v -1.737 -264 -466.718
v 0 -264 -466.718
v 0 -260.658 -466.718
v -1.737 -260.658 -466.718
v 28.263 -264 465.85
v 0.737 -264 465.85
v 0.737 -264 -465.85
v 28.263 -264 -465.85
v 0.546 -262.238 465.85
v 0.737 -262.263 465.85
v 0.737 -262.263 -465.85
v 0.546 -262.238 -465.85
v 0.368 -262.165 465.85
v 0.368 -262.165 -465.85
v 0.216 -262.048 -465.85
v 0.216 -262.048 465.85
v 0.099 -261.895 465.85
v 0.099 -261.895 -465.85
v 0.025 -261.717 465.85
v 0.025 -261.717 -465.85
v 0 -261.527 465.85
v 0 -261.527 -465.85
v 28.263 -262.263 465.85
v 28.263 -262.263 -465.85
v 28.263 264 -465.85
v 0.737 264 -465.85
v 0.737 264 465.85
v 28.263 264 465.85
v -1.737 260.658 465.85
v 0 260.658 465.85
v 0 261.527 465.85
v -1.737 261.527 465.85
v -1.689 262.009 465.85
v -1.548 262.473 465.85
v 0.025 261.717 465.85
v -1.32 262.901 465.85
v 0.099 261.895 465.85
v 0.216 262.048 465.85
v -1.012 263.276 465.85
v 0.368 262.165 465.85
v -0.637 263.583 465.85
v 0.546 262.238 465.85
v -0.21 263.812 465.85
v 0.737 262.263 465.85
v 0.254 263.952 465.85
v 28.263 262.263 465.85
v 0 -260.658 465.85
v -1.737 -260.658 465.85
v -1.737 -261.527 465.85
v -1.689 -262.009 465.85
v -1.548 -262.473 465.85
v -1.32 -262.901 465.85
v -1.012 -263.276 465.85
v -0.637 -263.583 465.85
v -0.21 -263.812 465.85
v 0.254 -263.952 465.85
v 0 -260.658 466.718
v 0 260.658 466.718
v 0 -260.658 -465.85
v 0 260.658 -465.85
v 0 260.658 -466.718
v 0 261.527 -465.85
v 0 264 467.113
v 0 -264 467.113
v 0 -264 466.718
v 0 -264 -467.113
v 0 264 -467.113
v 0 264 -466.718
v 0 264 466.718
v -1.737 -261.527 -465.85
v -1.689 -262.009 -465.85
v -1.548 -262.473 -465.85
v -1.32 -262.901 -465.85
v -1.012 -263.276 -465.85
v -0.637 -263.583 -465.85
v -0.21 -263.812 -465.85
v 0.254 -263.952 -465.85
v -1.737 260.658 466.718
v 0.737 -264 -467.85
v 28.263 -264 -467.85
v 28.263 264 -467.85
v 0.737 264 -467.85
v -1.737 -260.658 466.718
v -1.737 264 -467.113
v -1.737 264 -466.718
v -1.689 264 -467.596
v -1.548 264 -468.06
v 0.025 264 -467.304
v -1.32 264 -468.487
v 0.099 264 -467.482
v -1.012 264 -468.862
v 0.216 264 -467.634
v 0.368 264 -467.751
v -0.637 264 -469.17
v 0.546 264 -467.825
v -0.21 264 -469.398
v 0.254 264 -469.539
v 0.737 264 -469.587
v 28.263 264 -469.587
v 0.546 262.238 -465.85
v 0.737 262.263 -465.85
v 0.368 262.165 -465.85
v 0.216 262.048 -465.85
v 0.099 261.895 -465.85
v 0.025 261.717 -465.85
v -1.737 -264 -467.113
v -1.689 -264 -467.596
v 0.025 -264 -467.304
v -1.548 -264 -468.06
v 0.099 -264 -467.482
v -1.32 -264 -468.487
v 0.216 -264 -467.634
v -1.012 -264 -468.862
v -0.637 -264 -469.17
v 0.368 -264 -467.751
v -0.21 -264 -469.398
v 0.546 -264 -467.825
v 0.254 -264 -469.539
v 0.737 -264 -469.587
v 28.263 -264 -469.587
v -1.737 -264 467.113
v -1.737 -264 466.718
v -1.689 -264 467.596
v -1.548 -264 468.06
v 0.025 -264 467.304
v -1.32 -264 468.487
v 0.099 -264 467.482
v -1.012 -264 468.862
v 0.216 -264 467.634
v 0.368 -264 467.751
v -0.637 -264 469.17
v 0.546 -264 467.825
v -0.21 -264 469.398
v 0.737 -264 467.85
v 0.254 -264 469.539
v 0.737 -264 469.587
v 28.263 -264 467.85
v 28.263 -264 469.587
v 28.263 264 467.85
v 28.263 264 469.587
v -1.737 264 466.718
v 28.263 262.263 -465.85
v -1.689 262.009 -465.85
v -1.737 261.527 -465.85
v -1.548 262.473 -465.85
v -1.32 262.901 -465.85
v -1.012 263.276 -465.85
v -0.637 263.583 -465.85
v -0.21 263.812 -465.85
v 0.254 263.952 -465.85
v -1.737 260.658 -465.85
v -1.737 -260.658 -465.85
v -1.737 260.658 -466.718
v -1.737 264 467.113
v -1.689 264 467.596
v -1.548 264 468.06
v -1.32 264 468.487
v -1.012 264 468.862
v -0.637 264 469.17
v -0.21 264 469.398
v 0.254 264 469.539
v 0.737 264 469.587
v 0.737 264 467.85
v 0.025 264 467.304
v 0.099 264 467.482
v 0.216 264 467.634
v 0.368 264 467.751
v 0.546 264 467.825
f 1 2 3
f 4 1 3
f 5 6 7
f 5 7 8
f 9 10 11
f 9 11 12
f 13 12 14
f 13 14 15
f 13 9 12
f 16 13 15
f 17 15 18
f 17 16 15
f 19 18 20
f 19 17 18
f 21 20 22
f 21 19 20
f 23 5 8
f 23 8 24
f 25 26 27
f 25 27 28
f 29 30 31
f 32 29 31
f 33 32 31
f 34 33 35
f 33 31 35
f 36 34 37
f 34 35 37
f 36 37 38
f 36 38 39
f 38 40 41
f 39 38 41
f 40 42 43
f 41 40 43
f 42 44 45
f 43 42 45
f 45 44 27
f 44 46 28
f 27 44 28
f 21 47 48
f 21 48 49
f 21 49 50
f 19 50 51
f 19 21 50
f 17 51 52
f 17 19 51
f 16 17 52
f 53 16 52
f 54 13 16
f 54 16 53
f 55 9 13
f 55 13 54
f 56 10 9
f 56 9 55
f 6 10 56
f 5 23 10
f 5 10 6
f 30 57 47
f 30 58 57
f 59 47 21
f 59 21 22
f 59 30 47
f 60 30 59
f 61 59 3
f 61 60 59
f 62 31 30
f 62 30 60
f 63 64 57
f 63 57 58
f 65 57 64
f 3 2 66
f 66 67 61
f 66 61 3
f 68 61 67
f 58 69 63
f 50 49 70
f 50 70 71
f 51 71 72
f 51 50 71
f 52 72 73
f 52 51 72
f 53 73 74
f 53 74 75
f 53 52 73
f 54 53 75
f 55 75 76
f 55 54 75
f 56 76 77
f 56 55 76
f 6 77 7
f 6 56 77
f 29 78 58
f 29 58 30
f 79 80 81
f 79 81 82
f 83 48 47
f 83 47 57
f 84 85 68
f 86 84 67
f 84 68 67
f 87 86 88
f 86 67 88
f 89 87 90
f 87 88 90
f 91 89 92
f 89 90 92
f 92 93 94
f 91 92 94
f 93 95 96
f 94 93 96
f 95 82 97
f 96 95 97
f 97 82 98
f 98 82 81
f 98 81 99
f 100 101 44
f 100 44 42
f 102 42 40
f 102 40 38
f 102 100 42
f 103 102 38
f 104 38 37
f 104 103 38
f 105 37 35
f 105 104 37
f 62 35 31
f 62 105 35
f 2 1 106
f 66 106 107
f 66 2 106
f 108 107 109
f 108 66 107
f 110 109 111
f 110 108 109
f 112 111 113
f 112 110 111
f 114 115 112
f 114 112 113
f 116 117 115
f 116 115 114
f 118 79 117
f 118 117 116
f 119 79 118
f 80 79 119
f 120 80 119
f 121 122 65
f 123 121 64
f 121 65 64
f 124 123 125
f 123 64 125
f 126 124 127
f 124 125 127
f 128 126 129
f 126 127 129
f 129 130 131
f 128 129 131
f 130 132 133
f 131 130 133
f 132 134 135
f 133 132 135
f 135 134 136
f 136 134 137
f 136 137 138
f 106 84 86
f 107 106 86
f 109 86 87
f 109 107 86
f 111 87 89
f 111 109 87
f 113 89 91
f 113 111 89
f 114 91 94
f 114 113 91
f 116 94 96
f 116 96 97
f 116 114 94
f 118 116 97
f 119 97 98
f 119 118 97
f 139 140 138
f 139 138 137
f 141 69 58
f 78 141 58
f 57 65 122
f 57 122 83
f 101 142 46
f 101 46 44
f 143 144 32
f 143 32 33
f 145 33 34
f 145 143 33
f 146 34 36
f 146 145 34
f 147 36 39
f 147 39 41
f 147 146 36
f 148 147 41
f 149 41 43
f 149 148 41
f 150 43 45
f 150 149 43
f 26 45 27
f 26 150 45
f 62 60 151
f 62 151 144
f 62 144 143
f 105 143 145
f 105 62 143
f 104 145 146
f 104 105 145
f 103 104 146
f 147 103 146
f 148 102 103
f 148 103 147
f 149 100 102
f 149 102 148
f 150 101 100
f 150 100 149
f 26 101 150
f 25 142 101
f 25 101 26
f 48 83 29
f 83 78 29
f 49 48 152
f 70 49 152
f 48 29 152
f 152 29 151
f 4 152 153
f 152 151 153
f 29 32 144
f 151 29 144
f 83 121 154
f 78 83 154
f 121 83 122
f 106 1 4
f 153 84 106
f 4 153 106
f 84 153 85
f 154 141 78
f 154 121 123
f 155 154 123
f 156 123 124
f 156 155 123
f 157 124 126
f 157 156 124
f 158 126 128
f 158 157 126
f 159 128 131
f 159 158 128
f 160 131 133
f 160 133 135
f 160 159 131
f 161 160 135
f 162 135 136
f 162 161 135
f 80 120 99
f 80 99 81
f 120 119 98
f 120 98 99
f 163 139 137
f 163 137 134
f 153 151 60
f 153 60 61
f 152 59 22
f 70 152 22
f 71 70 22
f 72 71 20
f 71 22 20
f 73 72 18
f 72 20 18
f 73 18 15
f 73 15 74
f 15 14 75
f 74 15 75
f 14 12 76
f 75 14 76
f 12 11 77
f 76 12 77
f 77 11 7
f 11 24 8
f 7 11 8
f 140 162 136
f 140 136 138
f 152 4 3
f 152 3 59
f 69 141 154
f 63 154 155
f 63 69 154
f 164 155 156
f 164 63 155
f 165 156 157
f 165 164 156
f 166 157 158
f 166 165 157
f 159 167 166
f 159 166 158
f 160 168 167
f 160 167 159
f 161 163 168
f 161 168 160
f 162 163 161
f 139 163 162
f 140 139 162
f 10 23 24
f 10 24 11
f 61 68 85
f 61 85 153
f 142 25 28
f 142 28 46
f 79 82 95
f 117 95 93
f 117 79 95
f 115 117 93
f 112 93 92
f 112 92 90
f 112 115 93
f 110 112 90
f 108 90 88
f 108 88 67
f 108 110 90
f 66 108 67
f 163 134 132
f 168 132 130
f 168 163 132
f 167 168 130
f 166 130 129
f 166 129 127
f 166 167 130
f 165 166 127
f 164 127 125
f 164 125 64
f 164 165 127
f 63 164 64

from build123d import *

# Parameters (mm, degrees)
SKETCH1_W                     = 935.7
SKETCH1_H                     = 528
BASE_FLANGE1_DEPTH            = 1.7366
EDGE_FLANGE1_STRIP_W          = 8.4196
EDGE_FLANGE1_STRIP_H          = 1.7366
EDGE_FLANGE1_STRIP_CUT_DEPTH  = 931.7
EDGE_FLANGE1_RELIEF_W         = 9.2879
EDGE_FLANGE1_RELIEF_H         = 0.8683
EDGE_FLANGE1_RELIEF_CUT_DEPTH = 1.7366
EDGE_FLANGE1_DEPTH            = 931.7
EDGE_FLANGE2_STRIP_W          = 8.4196
EDGE_FLANGE2_STRIP_H          = 1.7366
EDGE_FLANGE2_STRIP_CUT_DEPTH  = 931.7
EDGE_FLANGE2_RELIEF_W         = 9.2879
EDGE_FLANGE2_RELIEF_H         = 0.8683
EDGE_FLANGE2_RELIEF_CUT_DEPTH = 1.7366
EDGE_FLANGE2_DEPTH            = 931.7
EDGE_FLANGE4_STRIP_W          = 8.4196
EDGE_FLANGE4_STRIP_H          = 1.7366
EDGE_FLANGE4_STRIP_CUT_DEPTH  = 528
EDGE_FLANGE4_DEPTH            = 528
EDGE_FLANGE5_STRIP_W          = 8.4196
EDGE_FLANGE5_STRIP_H          = 1.7366
EDGE_FLANGE5_STRIP_CUT_DEPTH  = 528
EDGE_FLANGE5_DEPTH            = 528


# Sheet-metal steps are written as plain solids
with BuildPart() as part:
    # Sketch1 → Base-Flange1 (new body)
    with BuildSketch(Plane(origin=(0, 0, 0), x_dir=(0, 0, -1), z_dir=(1, 0, 0))):
        Rectangle(SKETCH1_W, SKETCH1_H)
    extrude(amount=-BASE_FLANGE1_DEPTH)

    # Edge-Flange1 strip (across the edge) → Edge-Flange1 strip cut (cut)
    with BuildSketch(Plane(origin=(0, 264, -465.85), x_dir=(0, -1, 0), z_dir=(0, 0, 1))):
        with Locations((-1.7366, -0.8683)):
            Rectangle(EDGE_FLANGE1_STRIP_W, EDGE_FLANGE1_STRIP_H)
    extrude(amount=EDGE_FLANGE1_STRIP_CUT_DEPTH, mode=Mode.SUBTRACT)

    # Edge-Flange1 relief (on the sheet) → Edge-Flange1 relief cut (cut)
    with BuildSketch(Plane(origin=(0, 261.5268, -465.85), x_dir=(0, -1, 0), z_dir=(1, 0, 0))):
        with Locations((-3.77565, 0.43415)):
            Rectangle(EDGE_FLANGE1_RELIEF_W, EDGE_FLANGE1_RELIEF_H)
        with Locations((-3.77565, -932.13415)):
            Rectangle(EDGE_FLANGE1_RELIEF_W, EDGE_FLANGE1_RELIEF_H)
    extrude(amount=-EDGE_FLANGE1_RELIEF_CUT_DEPTH, mode=Mode.SUBTRACT)

    # Edge-Flange1 section (across the edge) → Edge-Flange1 (add)
    with BuildSketch(Plane(origin=(0, 264, -465.85), x_dir=(0, -1, 0), z_dir=(0, 0, 1))):
        with BuildLine():
            Line((0, 0.7366), (0, 28.2634))
            Line((0, 28.2634), (1.7366, 28.2634))
            Line((1.7366, 28.2634), (1.7366, 0.7366))
            ThreePointArc((1.7366, 0.7366), (1.952345145, 0.215745145), (2.4732, 0))
            Line((2.4732, 0), (2.4732, -1.7366))
            ThreePointArc((2.4732, -1.7366), (0.724383509, -1.012216491), (0, 0.7366))
        make_face()
    extrude(amount=EDGE_FLANGE1_DEPTH)

    # Edge-Flange2 strip (across the edge) → Edge-Flange2 strip cut (cut)
    with BuildSketch(Plane(origin=(0, -264, 465.85), x_dir=(0, 1, 0), z_dir=(0, 0, -1))):
        with Locations((-1.7366, -0.8683)):
            Rectangle(EDGE_FLANGE2_STRIP_W, EDGE_FLANGE2_STRIP_H)
    extrude(amount=EDGE_FLANGE2_STRIP_CUT_DEPTH, mode=Mode.SUBTRACT)

    # Edge-Flange2 relief (on the sheet) → Edge-Flange2 relief cut (cut)
    with BuildSketch(Plane(origin=(0, -261.5268, 465.85), x_dir=(0, 1, 0), z_dir=(1, 0, 0))):
        with Locations((-3.77565, 0.43415)):
            Rectangle(EDGE_FLANGE2_RELIEF_W, EDGE_FLANGE2_RELIEF_H)
        with Locations((-3.77565, -932.13415)):
            Rectangle(EDGE_FLANGE2_RELIEF_W, EDGE_FLANGE2_RELIEF_H)
    extrude(amount=-EDGE_FLANGE2_RELIEF_CUT_DEPTH, mode=Mode.SUBTRACT)

    # Edge-Flange2 section (across the edge) → Edge-Flange2 (add)
    with BuildSketch(Plane(origin=(0, -264, 465.85), x_dir=(0, 1, 0), z_dir=(0, 0, -1))):
        with BuildLine():
            Line((0, 0.7366), (0, 28.2634))
            Line((0, 28.2634), (1.7366, 28.2634))
            Line((1.7366, 28.2634), (1.7366, 0.7366))
            ThreePointArc((1.7366, 0.7366), (1.952345145, 0.215745145), (2.4732, 0))
            Line((2.4732, 0), (2.4732, -1.7366))
            ThreePointArc((2.4732, -1.7366), (0.724383509, -1.012216491), (0, 0.7366))
        make_face()
    extrude(amount=EDGE_FLANGE2_DEPTH)

    # Edge-Flange4 strip (across the edge) → Edge-Flange4 strip cut (cut)
    with BuildSketch(Plane(origin=(0, 264, 467.85), x_dir=(0, 0, -1), z_dir=(0, -1, 0))):
        with Locations((-3.4732, -0.8683)):
            Rectangle(EDGE_FLANGE4_STRIP_W, EDGE_FLANGE4_STRIP_H)
    extrude(amount=EDGE_FLANGE4_STRIP_CUT_DEPTH, mode=Mode.SUBTRACT)

    # Edge-Flange4 section (across the edge) → Edge-Flange4 (add)
    with BuildSketch(Plane(origin=(0, 264, 467.85), x_dir=(0, 0, -1), z_dir=(0, -1, 0))):
        with BuildLine():
            Line((-1.7366, 0.7366), (-1.7366, 28.2634))
            Line((-1.7366, 28.2634), (0, 28.2634))
            Line((0, 28.2634), (0, 0.7366))
            ThreePointArc((0, 0.7366), (0.215745145, 0.215745145), (0.7366, 0))
            Line((0.7366, 0), (0.7366, -1.7366))
            ThreePointArc((0.7366, -1.7366), (-1.012216491, -1.012216491), (-1.7366, 0.7366))
        make_face()
    extrude(amount=EDGE_FLANGE4_DEPTH)

    # Edge-Flange5 strip (across the edge) → Edge-Flange5 strip cut (cut)
    with BuildSketch(Plane(origin=(0, -264, -467.85), x_dir=(0, 0, 1), z_dir=(0, 1, 0))):
        with Locations((-3.4732, -0.8683)):
            Rectangle(EDGE_FLANGE5_STRIP_W, EDGE_FLANGE5_STRIP_H)
    extrude(amount=EDGE_FLANGE5_STRIP_CUT_DEPTH, mode=Mode.SUBTRACT)

    # Edge-Flange5 section (across the edge) → Edge-Flange5 (add)
    with BuildSketch(Plane(origin=(0, -264, -467.85), x_dir=(0, 0, 1), z_dir=(0, 1, 0))):
        with BuildLine():
            Line((-1.7366, 0.7366), (-1.7366, 28.2634))
            Line((-1.7366, 28.2634), (0, 28.2634))
            Line((0, 28.2634), (0, 0.7366))
            ThreePointArc((0, 0.7366), (0.215745145, 0.215745145), (0.7366, 0))
            Line((0.7366, 0), (0.7366, -1.7366))
            ThreePointArc((0.7366, -1.7366), (-1.012216491, -1.012216491), (-1.7366, 0.7366))
        make_face()
    extrude(amount=EDGE_FLANGE5_DEPTH)


solid = part.part
